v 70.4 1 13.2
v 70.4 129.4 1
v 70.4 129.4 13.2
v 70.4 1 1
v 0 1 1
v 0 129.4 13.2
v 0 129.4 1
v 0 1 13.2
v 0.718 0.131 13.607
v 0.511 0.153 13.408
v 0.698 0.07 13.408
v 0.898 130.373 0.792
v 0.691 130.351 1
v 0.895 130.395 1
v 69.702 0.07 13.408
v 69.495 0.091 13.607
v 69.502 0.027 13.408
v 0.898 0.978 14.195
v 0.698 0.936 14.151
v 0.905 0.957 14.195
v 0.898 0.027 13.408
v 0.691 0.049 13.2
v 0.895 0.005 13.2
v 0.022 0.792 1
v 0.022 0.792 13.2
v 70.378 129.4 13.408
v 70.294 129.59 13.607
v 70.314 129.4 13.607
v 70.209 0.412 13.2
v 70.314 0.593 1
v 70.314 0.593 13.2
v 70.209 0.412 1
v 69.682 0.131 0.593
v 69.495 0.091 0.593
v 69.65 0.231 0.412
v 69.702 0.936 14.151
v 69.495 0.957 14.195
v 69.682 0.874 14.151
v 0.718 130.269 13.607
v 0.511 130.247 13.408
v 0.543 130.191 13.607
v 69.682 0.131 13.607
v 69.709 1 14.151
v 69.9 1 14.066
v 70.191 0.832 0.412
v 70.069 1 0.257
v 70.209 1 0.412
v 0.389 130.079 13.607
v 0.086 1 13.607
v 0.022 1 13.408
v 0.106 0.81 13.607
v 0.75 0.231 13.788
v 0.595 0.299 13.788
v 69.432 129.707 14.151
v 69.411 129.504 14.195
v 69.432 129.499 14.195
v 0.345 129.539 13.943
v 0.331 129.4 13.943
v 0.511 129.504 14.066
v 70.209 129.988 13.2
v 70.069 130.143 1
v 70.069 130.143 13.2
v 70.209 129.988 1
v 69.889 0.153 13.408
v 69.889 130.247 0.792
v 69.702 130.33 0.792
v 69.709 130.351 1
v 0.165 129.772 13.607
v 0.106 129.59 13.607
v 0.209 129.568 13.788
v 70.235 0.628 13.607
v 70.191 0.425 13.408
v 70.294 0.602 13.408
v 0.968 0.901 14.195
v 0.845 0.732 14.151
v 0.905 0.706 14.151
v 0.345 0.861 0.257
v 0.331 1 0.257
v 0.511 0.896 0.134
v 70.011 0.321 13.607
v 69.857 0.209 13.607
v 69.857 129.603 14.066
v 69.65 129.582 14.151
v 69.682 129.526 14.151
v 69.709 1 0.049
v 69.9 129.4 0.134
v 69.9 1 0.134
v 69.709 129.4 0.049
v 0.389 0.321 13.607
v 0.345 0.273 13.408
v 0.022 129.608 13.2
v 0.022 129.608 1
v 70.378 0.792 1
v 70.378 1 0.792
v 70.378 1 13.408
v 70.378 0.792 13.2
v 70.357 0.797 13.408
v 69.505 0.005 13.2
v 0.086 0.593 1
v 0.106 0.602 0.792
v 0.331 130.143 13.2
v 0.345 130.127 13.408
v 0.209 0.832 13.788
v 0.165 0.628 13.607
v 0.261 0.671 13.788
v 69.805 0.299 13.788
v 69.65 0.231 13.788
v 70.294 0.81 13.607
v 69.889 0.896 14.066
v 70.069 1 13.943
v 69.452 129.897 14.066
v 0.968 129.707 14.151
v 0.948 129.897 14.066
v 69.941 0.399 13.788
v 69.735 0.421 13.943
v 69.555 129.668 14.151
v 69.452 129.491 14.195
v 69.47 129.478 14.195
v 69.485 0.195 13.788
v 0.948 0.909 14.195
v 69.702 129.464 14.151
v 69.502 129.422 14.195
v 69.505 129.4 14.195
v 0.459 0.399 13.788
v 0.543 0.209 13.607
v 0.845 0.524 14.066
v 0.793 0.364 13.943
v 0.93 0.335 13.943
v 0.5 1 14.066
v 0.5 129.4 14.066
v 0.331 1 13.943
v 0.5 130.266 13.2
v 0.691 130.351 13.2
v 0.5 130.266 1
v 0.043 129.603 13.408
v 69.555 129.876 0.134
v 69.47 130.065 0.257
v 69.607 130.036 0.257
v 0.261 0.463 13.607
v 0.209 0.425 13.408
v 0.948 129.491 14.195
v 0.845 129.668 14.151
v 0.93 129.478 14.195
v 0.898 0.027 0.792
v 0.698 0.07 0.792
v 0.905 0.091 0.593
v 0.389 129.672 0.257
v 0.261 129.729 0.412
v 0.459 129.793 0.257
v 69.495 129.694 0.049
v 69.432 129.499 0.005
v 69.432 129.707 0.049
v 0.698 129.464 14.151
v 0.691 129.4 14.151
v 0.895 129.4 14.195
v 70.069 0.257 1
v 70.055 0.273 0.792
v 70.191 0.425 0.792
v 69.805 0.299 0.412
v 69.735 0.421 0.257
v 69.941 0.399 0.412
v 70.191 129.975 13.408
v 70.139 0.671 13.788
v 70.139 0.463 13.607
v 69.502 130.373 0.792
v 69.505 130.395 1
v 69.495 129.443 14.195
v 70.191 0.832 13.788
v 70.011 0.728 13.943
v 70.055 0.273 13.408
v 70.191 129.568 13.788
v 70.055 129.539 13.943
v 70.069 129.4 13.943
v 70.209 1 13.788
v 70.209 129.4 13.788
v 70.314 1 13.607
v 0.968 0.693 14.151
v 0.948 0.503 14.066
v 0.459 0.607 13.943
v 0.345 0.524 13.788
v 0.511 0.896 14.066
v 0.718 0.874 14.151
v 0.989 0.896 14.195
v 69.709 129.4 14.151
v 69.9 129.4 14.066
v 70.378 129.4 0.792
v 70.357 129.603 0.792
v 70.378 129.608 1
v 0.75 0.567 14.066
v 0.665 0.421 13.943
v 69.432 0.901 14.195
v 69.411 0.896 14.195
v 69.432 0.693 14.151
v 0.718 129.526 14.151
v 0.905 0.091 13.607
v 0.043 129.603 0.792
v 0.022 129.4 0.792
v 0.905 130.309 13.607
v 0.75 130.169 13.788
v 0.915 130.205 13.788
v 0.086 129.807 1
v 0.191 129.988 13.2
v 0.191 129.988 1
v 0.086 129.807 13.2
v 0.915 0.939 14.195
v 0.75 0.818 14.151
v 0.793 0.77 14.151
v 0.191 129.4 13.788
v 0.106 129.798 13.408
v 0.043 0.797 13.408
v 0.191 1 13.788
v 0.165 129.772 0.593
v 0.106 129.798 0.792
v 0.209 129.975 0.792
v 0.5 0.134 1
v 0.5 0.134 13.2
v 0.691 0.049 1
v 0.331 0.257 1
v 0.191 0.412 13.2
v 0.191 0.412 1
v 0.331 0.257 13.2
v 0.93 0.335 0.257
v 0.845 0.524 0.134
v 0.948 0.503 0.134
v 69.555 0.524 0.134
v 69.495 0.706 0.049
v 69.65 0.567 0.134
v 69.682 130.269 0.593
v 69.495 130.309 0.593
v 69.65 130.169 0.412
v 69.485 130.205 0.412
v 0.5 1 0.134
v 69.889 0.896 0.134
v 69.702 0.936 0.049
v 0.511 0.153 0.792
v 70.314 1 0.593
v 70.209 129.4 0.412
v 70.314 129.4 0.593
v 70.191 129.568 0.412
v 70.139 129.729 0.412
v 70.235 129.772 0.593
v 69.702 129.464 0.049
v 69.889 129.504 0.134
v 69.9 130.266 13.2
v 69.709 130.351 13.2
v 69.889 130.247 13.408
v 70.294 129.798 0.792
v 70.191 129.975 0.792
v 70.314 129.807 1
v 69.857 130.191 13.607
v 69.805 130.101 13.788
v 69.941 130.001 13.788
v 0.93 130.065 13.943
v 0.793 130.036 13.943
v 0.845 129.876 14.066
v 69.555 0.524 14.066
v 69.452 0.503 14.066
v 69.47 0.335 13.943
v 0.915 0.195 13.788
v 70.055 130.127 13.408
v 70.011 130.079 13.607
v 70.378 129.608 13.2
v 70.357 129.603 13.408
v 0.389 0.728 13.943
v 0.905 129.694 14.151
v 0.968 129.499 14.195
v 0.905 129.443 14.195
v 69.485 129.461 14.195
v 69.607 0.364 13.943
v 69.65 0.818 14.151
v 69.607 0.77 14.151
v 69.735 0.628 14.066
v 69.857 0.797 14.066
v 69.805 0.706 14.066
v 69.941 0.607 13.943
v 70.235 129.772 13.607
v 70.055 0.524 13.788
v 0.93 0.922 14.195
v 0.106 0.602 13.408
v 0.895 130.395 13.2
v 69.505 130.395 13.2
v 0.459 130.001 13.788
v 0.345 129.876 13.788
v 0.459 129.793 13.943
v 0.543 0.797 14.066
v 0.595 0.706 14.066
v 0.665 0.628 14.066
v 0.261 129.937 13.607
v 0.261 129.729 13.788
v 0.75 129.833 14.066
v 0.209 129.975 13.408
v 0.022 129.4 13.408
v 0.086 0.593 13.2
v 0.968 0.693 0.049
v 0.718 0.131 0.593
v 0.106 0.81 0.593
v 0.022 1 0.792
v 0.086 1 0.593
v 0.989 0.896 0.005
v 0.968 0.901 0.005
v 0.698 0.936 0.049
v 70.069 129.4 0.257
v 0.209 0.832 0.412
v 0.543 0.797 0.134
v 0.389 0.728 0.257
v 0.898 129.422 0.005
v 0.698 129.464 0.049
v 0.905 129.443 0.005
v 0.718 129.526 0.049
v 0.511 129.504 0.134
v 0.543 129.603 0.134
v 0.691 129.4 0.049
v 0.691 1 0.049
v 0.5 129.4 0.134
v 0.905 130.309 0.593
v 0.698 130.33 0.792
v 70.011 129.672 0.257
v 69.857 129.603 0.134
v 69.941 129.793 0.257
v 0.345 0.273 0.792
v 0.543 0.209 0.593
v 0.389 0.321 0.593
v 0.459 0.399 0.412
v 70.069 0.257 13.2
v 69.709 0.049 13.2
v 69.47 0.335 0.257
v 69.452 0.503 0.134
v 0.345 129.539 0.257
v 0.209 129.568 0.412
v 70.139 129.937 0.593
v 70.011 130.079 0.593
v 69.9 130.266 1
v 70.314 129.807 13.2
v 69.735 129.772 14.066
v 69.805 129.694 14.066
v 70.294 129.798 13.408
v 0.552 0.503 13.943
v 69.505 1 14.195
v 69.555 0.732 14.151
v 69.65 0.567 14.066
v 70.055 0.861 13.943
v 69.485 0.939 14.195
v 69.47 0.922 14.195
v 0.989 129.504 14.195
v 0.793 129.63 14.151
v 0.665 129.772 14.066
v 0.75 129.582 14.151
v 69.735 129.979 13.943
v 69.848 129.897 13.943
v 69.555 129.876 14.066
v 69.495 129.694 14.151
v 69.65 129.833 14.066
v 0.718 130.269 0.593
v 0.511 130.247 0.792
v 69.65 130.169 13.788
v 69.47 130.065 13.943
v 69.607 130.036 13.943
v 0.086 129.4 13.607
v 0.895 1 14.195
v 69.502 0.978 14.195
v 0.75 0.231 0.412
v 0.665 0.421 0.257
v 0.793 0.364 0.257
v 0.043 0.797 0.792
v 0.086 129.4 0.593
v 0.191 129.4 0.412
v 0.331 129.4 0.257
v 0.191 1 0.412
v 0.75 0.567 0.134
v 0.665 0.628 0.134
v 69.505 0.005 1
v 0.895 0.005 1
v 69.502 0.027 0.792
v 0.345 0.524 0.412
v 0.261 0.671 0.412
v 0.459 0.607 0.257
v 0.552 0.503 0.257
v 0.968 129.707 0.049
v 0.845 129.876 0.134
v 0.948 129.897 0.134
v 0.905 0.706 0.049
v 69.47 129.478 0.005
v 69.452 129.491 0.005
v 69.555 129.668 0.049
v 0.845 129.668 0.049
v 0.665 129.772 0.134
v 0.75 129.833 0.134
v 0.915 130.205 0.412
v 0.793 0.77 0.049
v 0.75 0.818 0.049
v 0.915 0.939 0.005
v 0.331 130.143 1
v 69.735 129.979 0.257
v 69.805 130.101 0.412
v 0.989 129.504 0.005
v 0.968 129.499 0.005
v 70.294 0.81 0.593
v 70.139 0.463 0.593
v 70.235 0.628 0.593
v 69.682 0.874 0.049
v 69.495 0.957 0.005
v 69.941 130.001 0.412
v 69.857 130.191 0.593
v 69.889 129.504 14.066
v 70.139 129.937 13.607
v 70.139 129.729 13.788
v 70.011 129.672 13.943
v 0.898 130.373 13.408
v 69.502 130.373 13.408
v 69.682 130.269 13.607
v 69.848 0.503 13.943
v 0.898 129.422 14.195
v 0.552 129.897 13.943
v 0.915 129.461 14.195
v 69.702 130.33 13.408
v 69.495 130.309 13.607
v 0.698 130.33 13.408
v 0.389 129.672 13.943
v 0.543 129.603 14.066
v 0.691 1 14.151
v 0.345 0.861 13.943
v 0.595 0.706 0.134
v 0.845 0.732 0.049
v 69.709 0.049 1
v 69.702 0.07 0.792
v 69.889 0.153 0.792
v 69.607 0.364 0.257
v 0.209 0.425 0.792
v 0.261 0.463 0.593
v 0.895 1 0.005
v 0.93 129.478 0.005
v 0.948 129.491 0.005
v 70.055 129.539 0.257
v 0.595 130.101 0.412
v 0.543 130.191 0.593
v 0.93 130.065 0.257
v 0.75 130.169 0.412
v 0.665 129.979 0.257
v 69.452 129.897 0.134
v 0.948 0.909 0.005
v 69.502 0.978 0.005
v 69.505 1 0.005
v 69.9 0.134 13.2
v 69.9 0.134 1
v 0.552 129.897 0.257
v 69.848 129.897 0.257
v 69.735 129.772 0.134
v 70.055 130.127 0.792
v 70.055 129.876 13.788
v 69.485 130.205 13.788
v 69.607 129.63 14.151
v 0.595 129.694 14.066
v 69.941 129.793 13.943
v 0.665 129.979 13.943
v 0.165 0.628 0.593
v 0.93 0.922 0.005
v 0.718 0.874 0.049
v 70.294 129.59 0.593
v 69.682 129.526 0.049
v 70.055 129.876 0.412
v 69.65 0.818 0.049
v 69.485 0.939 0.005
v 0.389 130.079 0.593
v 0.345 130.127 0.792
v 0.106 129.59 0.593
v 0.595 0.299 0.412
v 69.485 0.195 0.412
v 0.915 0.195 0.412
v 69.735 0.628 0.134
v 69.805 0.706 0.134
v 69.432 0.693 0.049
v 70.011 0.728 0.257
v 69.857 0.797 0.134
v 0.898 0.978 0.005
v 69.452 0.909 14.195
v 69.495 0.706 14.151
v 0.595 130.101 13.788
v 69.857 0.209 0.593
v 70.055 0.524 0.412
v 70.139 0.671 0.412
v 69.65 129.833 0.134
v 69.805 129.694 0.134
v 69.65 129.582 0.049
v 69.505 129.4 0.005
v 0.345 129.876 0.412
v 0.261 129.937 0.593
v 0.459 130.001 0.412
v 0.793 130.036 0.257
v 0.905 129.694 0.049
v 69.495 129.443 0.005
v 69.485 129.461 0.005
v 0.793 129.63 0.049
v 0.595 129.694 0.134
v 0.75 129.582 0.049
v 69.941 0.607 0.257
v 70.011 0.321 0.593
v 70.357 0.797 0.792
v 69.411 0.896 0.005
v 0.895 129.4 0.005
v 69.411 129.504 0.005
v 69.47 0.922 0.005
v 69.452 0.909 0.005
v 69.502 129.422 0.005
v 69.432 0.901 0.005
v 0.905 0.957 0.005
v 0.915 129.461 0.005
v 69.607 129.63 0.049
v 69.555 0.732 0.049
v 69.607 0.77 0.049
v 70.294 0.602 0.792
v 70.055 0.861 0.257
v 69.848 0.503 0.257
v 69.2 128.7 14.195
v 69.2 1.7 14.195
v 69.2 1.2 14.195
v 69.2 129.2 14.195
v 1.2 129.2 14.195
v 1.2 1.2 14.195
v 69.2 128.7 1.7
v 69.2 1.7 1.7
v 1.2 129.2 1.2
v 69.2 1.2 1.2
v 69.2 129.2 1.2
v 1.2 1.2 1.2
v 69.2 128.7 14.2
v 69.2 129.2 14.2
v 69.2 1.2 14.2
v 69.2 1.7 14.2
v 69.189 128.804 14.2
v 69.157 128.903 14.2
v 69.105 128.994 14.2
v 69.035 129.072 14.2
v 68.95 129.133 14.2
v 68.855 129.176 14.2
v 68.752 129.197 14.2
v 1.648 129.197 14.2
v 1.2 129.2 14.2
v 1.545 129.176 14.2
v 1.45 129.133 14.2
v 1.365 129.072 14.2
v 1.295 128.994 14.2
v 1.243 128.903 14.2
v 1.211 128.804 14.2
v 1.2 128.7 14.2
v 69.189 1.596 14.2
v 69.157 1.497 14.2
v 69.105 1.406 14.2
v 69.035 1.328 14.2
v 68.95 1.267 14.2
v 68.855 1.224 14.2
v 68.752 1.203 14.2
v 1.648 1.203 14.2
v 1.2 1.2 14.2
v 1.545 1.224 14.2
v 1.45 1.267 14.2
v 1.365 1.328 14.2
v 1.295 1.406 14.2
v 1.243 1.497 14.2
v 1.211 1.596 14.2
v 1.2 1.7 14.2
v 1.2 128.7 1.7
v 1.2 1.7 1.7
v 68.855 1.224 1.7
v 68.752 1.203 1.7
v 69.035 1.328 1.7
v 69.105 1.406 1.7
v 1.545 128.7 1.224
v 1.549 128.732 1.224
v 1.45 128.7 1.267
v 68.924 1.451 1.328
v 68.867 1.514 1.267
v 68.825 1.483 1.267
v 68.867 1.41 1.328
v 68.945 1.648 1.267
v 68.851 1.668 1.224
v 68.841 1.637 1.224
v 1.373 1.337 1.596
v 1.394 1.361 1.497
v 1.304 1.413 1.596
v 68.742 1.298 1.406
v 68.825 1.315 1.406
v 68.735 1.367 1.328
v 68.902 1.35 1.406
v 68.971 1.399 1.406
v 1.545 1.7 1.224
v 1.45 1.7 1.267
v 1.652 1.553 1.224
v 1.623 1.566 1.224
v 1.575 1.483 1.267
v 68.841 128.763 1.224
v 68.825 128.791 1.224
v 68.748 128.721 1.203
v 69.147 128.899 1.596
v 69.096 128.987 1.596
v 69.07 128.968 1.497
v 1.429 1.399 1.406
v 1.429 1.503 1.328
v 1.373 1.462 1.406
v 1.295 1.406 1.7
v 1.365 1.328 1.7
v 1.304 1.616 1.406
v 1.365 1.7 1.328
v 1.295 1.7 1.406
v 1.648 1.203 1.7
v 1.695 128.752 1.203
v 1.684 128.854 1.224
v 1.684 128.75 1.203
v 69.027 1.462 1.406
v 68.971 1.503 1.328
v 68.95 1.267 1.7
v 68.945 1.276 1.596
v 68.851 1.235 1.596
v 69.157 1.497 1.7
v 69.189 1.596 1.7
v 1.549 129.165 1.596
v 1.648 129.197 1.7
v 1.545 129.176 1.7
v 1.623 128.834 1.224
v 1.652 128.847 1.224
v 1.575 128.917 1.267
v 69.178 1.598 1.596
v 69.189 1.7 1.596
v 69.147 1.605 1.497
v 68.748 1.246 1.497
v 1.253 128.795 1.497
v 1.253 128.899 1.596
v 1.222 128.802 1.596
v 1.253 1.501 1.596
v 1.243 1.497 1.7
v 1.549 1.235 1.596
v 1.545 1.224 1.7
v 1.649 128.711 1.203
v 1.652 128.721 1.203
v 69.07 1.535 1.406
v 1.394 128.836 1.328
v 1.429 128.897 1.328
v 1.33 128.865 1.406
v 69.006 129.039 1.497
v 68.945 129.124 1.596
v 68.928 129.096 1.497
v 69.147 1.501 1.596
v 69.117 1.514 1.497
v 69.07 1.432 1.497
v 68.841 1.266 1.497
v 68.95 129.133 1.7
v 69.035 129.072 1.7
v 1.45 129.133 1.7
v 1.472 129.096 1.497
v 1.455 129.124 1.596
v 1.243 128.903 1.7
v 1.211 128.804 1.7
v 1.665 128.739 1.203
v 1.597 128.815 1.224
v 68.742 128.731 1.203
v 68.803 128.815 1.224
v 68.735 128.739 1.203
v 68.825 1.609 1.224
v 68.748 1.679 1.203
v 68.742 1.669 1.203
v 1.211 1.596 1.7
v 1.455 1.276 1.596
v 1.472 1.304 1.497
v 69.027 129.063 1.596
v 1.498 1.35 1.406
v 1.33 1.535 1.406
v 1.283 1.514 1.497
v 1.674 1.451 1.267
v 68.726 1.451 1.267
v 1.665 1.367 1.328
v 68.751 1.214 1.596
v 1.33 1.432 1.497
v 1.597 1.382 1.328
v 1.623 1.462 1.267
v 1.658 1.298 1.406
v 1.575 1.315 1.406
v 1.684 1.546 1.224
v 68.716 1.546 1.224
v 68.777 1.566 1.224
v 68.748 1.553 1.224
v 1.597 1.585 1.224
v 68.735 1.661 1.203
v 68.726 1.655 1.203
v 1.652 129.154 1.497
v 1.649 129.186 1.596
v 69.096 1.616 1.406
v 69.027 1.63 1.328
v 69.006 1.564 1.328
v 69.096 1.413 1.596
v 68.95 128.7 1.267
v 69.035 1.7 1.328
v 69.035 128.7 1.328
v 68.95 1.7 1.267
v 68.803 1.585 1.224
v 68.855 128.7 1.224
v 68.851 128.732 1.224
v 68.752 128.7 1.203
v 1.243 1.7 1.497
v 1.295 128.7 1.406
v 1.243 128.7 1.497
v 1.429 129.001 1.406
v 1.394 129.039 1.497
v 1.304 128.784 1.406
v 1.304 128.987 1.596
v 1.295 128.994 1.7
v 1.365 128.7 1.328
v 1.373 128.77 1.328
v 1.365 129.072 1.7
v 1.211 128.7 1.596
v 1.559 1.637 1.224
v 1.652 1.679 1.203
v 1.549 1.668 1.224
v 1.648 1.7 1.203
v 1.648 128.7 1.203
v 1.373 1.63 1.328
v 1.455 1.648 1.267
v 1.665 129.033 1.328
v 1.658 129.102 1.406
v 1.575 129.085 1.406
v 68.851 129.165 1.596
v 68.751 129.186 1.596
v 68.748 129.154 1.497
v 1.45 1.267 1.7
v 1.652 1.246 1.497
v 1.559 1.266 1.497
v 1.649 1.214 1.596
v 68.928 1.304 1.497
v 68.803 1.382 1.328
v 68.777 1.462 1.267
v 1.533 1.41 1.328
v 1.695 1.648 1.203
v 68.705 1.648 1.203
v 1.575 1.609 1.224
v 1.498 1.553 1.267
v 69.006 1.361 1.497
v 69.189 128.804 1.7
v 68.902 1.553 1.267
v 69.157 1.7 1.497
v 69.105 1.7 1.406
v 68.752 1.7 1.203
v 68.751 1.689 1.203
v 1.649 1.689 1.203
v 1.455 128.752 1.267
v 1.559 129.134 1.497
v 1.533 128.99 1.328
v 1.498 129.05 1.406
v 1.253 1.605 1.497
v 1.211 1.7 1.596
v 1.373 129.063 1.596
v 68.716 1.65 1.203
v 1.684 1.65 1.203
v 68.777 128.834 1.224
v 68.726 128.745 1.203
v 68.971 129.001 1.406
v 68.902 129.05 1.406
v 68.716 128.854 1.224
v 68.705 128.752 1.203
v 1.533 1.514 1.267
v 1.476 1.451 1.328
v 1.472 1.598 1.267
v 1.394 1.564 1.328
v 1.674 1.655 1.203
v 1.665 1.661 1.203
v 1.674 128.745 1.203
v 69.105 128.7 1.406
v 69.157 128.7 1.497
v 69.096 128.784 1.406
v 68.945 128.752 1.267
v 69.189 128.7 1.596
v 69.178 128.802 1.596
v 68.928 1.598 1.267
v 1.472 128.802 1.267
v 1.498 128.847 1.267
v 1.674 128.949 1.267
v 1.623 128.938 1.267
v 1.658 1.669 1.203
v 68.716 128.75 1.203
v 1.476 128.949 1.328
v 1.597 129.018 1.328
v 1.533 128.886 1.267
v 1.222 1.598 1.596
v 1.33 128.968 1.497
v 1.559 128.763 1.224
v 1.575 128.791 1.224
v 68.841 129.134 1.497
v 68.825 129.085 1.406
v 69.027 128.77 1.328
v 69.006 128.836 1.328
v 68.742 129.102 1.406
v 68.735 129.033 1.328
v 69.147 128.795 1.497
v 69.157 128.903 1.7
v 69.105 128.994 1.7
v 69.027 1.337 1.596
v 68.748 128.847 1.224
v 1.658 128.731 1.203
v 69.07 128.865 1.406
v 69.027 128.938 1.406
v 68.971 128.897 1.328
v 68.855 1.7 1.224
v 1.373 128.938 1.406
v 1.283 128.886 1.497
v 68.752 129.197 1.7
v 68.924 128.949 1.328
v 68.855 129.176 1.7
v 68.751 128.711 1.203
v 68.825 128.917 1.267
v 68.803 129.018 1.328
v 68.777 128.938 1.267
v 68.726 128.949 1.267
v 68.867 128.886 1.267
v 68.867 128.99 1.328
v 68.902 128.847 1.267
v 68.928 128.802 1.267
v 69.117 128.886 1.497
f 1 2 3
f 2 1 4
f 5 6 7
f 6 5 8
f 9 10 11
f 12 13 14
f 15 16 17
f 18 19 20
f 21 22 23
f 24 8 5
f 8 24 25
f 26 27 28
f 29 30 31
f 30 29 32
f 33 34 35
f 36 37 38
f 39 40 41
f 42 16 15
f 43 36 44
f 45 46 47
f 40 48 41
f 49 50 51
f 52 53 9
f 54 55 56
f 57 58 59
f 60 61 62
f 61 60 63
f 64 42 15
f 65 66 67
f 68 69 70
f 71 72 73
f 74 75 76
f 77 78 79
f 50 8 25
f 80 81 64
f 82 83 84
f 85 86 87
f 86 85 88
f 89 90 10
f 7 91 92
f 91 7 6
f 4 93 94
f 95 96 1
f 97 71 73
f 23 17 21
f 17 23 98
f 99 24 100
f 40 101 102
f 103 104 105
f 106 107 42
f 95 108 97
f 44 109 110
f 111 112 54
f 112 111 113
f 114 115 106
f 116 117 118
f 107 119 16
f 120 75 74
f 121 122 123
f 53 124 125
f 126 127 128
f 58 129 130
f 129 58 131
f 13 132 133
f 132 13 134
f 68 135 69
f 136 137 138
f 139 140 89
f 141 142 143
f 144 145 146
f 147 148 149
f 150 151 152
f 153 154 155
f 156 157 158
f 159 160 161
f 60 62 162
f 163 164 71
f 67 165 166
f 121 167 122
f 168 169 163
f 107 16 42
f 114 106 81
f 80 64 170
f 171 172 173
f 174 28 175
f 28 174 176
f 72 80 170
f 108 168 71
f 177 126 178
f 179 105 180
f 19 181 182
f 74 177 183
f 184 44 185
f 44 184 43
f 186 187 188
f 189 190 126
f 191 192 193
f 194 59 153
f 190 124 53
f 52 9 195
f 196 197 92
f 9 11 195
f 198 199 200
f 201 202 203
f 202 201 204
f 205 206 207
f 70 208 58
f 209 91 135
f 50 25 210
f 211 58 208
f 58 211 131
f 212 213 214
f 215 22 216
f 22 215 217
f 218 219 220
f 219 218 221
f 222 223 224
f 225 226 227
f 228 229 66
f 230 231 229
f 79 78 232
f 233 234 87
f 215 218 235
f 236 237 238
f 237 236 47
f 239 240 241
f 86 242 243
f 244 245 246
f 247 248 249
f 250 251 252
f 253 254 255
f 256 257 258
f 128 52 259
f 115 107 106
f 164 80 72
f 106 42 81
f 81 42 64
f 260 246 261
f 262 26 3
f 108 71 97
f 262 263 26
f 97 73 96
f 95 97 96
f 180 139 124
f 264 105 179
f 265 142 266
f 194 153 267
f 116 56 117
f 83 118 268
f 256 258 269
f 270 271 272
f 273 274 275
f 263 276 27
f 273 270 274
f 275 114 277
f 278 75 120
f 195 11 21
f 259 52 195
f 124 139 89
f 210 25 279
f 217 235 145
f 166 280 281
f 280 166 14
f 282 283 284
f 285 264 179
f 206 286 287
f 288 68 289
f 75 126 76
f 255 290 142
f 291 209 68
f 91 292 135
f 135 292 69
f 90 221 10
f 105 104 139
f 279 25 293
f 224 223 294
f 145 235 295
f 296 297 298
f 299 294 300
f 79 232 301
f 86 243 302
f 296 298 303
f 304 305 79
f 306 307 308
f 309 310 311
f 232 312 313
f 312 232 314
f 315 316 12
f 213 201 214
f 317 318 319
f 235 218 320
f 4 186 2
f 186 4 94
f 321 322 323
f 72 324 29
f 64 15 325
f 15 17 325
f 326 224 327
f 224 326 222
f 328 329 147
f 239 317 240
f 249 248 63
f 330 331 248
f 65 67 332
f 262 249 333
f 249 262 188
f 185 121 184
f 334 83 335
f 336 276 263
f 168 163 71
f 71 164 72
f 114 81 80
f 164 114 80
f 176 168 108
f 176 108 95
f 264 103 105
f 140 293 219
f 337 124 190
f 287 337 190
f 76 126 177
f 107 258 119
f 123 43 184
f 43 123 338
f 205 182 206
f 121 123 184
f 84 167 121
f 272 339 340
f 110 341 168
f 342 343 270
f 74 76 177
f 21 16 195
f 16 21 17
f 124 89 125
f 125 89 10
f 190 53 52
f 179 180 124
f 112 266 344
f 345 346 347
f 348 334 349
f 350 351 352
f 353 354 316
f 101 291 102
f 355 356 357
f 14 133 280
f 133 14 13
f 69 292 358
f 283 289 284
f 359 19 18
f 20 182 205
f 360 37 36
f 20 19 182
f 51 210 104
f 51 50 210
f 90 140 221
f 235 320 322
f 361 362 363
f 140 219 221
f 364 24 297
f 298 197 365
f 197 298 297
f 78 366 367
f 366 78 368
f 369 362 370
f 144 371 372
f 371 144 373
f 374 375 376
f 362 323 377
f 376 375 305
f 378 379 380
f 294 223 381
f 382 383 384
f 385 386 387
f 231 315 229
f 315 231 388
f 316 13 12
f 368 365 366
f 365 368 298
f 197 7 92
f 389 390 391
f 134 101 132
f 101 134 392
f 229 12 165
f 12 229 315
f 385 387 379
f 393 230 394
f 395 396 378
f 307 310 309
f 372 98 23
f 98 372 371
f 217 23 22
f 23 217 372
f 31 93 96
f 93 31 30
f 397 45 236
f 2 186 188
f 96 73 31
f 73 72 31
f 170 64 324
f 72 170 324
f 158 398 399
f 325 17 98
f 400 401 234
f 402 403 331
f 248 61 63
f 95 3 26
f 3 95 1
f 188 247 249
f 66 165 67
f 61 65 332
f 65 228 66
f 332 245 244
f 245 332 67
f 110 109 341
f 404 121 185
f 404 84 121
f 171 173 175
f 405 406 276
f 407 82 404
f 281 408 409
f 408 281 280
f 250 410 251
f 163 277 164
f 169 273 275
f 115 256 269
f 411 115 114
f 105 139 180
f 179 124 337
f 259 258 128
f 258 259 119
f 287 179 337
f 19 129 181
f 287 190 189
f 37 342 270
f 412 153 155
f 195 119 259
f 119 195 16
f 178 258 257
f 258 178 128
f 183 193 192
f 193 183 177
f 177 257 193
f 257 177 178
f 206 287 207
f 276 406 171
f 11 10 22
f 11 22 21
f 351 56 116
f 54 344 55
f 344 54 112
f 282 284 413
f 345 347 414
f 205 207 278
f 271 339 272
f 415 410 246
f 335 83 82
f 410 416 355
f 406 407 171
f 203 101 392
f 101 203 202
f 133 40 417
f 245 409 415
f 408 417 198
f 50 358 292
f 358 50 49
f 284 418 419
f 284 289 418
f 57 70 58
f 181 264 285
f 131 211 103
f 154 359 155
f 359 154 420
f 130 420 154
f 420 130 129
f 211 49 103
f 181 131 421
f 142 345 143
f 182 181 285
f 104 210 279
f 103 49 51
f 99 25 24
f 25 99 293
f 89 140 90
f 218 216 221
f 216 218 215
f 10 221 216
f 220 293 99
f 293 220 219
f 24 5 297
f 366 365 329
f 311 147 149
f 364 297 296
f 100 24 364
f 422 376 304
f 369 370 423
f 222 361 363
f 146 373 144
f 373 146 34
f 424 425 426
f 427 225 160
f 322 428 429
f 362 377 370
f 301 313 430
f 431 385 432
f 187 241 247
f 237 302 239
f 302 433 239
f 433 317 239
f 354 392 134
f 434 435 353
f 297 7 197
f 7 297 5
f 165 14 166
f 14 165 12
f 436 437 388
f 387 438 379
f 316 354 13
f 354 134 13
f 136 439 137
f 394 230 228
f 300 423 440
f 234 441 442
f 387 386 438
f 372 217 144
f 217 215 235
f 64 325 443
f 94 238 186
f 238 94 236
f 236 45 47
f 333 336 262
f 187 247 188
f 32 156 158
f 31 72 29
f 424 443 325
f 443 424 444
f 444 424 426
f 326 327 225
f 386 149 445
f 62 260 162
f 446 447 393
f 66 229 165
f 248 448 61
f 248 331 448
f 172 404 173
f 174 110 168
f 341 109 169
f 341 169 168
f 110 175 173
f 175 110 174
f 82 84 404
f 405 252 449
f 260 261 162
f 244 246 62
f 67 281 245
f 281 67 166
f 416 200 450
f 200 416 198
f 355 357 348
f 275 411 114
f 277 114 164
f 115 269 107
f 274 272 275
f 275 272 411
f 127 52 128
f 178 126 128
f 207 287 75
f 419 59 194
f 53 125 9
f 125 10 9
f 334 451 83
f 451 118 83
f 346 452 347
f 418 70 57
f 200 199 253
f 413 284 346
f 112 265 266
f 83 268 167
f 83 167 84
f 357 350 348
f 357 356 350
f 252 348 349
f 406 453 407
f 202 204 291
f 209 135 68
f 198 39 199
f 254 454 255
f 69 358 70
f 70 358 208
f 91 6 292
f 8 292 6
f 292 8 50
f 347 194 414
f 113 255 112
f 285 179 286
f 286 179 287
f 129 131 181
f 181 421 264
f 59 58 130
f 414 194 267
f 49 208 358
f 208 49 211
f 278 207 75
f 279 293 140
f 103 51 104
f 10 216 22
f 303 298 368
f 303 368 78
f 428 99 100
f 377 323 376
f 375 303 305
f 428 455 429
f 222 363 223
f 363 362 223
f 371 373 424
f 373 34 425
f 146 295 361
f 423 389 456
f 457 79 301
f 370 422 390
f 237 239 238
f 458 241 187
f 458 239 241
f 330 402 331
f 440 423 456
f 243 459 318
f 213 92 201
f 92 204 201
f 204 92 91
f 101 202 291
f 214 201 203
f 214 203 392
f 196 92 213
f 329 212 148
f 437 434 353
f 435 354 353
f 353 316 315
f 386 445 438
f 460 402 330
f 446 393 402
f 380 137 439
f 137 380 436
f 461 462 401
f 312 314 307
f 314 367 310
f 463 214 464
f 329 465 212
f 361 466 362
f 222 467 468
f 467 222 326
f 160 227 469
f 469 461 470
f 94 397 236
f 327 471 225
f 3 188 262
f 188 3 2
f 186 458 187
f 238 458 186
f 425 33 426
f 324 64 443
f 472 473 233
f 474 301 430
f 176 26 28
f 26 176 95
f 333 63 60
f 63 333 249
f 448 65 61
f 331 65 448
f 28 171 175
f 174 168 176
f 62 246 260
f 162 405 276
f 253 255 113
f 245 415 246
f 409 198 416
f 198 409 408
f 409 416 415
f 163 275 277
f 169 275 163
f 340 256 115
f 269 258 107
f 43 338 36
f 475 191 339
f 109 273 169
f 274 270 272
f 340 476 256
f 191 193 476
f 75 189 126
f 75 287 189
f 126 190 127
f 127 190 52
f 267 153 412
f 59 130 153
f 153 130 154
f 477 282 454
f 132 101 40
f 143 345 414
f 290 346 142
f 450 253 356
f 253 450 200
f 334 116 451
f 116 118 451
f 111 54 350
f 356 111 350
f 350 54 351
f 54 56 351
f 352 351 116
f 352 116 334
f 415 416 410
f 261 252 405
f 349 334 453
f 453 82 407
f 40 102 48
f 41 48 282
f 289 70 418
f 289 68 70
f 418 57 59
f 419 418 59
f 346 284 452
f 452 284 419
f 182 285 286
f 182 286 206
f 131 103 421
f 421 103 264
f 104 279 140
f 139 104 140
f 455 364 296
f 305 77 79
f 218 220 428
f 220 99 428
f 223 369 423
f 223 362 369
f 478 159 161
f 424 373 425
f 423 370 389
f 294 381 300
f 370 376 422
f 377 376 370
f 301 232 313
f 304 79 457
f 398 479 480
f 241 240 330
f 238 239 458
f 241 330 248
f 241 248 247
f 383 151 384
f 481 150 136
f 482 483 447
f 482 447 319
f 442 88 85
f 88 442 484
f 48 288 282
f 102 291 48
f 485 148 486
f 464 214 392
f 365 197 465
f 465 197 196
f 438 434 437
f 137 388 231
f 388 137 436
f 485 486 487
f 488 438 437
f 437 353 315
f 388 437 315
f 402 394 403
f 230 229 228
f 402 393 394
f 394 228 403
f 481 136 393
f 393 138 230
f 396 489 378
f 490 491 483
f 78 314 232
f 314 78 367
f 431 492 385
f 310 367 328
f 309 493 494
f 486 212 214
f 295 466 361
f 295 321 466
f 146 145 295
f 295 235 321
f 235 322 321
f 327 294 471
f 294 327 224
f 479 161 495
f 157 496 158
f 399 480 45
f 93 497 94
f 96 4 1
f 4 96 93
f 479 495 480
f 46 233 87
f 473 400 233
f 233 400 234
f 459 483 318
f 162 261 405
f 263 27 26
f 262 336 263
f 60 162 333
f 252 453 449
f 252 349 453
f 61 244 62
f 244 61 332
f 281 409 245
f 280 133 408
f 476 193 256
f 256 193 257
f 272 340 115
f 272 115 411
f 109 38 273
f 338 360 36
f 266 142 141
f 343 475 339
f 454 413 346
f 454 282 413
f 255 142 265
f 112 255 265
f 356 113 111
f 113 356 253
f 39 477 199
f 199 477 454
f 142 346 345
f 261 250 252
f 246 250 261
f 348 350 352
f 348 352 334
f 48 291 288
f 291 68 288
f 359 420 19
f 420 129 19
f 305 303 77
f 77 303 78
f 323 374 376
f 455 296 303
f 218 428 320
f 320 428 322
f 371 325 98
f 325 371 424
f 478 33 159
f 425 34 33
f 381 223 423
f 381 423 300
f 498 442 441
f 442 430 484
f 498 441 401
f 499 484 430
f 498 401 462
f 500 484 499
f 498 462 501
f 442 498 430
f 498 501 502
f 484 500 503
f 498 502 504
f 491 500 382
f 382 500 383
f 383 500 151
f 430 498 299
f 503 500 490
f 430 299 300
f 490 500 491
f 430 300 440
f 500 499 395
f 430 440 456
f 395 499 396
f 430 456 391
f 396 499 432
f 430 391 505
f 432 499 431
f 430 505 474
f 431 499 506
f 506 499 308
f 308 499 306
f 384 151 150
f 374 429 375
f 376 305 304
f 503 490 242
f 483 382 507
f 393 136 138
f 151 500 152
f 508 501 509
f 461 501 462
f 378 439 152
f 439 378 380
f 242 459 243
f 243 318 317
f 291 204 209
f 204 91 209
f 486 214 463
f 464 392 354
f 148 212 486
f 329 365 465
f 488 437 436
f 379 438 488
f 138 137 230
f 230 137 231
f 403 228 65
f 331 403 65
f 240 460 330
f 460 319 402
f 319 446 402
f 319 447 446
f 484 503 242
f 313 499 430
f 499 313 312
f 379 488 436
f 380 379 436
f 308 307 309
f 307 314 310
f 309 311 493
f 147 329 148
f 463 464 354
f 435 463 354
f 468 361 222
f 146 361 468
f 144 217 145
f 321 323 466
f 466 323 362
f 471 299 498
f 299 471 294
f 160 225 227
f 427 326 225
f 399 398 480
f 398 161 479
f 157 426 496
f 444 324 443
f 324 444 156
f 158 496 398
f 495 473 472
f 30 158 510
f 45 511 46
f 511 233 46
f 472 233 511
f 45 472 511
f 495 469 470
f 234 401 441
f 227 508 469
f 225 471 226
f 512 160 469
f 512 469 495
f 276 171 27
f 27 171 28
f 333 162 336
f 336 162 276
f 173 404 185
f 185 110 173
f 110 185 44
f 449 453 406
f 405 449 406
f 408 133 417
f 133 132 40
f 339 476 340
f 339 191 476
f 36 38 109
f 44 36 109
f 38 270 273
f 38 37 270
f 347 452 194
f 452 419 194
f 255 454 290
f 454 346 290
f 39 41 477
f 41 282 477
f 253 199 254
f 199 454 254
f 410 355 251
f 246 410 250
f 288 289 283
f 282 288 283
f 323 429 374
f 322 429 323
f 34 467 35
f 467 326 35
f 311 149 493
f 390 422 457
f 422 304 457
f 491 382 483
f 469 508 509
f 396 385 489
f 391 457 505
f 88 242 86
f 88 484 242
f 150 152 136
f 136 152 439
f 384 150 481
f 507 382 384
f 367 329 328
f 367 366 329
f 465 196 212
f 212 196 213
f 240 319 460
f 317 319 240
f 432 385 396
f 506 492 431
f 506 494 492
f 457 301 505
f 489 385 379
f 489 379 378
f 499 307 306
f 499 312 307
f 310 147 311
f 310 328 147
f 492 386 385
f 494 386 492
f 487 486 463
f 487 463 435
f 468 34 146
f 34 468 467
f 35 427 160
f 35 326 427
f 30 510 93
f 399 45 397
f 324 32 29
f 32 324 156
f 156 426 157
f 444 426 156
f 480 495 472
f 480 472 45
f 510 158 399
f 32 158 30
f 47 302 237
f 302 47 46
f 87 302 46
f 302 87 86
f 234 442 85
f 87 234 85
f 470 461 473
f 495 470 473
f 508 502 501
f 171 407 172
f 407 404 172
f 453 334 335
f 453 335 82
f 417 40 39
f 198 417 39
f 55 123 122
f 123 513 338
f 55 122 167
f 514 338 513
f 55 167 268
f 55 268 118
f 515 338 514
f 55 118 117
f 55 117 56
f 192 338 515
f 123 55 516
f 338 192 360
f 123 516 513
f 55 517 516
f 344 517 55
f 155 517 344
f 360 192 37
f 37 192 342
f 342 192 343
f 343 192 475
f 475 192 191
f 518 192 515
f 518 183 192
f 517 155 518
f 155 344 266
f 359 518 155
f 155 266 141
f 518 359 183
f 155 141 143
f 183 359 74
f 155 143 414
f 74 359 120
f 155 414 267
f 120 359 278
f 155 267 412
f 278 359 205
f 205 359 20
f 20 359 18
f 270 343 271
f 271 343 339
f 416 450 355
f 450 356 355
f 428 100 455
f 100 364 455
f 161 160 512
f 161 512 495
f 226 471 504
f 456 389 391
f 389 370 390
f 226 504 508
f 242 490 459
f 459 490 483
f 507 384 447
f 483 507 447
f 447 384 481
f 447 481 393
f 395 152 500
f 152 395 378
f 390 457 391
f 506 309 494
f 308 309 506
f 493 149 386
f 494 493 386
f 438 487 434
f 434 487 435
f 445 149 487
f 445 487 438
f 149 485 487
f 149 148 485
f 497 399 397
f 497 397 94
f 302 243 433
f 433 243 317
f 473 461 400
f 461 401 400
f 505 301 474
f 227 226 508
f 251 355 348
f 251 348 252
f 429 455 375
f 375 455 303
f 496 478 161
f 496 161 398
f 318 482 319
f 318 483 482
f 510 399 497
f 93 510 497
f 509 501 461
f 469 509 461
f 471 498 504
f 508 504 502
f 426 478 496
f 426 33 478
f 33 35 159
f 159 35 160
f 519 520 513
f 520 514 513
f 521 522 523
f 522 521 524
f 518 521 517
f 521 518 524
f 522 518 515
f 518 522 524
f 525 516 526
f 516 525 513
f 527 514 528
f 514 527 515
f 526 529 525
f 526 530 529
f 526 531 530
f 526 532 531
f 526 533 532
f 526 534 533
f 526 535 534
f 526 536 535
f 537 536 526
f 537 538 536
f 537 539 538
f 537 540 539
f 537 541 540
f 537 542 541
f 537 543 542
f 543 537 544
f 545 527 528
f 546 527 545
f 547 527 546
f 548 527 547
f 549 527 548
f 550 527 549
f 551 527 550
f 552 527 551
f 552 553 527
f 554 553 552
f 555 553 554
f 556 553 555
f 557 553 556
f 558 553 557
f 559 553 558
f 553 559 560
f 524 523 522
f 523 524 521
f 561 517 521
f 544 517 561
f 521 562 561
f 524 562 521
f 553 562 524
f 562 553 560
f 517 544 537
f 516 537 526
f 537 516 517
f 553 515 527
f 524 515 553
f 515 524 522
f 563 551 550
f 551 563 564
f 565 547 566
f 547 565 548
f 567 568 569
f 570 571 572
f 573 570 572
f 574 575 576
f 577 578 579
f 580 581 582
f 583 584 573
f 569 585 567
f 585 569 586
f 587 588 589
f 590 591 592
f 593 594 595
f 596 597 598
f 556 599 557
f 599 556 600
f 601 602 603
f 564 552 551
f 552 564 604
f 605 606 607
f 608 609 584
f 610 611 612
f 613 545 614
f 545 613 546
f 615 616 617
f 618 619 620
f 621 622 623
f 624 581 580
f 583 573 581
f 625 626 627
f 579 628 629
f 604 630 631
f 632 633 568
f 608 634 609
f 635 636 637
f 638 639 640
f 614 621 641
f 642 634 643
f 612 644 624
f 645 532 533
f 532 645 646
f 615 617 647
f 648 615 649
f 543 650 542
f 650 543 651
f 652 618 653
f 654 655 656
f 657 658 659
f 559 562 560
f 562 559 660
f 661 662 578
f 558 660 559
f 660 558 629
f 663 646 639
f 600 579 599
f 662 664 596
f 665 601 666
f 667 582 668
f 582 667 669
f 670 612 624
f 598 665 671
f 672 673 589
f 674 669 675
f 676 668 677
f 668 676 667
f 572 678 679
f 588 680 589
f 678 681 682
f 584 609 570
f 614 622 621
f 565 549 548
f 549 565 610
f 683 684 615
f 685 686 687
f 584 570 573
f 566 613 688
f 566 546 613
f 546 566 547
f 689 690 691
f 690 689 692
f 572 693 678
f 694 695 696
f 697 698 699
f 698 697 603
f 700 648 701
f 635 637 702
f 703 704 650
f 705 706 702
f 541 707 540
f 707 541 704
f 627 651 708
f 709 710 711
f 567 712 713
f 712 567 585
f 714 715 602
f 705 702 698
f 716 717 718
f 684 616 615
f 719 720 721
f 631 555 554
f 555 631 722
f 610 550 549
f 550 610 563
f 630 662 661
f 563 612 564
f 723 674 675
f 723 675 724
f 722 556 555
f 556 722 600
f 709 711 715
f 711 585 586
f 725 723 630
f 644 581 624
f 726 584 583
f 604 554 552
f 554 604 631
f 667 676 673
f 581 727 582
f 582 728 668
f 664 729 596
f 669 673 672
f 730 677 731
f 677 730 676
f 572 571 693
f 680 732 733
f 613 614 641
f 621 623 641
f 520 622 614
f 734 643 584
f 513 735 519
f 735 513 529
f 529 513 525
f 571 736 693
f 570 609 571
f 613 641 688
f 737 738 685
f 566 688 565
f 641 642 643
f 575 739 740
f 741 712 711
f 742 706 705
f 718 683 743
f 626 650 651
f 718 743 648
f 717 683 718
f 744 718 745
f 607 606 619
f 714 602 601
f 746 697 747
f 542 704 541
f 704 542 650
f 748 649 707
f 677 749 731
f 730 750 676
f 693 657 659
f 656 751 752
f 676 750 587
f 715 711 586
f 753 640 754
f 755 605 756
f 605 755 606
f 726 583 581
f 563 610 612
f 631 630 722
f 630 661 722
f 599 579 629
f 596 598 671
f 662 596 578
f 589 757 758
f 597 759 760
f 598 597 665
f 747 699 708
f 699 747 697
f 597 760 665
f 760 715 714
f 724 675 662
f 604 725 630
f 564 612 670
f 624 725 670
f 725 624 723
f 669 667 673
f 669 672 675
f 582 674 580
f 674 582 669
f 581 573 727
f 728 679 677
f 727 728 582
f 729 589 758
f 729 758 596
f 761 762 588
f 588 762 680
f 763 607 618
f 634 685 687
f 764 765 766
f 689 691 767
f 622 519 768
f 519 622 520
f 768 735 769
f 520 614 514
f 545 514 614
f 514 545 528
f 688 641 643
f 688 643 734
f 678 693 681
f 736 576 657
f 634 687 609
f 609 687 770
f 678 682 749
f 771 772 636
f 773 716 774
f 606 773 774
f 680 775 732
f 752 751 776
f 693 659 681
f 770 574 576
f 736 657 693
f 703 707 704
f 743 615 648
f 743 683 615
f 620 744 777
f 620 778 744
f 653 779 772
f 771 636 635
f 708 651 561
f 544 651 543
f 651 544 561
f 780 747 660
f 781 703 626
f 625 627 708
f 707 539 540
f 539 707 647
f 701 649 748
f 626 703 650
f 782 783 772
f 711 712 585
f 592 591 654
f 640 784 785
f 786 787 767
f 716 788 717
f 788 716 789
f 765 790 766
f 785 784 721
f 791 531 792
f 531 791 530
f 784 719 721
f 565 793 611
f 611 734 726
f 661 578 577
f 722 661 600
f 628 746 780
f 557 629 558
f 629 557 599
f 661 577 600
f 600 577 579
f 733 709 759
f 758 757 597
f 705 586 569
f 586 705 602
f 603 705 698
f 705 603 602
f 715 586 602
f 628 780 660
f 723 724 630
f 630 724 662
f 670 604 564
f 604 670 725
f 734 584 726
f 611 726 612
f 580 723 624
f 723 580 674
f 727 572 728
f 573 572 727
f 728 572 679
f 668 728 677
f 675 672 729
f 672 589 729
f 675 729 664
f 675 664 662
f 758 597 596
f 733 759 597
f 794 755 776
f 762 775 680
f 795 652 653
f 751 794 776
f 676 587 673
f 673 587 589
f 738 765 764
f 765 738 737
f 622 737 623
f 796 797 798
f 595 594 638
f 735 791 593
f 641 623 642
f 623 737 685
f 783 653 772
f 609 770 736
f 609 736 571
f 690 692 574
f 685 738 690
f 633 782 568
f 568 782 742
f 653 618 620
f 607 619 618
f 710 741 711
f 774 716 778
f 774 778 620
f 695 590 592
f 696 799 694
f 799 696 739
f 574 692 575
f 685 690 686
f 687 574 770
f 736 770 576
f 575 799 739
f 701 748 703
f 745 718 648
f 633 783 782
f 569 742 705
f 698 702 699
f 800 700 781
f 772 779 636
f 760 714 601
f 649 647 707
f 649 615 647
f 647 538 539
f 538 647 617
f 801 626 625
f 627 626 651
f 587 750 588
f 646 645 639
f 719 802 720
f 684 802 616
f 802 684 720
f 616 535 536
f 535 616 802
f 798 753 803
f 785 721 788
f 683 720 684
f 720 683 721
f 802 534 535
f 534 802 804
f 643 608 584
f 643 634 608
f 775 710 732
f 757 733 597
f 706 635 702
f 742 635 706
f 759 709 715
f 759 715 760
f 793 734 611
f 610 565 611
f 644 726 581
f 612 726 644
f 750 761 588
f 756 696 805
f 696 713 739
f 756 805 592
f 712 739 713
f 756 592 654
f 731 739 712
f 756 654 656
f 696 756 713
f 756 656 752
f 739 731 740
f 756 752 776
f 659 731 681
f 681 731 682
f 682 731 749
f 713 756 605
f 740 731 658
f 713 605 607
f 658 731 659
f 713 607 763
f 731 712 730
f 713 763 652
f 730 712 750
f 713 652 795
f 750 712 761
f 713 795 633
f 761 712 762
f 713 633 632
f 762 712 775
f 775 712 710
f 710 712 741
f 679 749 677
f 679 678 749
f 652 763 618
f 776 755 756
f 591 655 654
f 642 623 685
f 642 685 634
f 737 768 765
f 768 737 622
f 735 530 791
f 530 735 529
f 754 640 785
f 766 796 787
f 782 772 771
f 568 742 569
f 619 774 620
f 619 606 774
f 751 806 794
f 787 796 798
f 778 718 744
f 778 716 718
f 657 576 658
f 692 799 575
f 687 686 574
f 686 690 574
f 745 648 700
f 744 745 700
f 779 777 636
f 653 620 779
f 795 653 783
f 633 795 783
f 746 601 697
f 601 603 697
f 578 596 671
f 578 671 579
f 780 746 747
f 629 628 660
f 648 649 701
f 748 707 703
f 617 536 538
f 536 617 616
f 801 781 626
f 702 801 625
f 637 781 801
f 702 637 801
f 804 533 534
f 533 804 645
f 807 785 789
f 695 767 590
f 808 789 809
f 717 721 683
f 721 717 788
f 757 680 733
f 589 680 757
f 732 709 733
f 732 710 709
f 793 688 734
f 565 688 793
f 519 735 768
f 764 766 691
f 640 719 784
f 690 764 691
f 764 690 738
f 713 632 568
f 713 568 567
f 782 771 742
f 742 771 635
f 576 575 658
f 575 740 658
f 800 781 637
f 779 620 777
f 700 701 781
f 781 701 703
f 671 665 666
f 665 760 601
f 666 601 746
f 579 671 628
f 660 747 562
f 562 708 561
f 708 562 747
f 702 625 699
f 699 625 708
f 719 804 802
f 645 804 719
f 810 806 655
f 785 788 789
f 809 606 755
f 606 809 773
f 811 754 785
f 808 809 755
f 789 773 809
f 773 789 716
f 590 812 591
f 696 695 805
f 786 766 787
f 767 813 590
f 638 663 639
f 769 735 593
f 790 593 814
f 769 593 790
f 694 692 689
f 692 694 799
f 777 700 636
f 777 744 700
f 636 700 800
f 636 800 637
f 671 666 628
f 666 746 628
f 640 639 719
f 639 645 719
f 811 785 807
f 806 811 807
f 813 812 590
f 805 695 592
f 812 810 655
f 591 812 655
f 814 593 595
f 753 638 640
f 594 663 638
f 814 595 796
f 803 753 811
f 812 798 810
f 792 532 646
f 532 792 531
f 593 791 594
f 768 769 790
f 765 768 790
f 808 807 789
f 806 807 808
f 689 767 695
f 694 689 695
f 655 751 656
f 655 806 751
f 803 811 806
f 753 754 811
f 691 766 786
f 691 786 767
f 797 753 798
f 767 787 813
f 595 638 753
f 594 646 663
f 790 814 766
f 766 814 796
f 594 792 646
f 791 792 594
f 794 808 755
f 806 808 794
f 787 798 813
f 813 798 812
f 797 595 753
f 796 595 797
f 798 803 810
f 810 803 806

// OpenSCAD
// Download both files into the same directory and make a copy of this template for each project. Adjust the variables and values as needed to override the defaults in this file as needed. In this way you can replace the `Ultimate_Box_Generator.scad` file with a new version without having to track and restore your changes.

// If you want to use any framework variables in calulations you must import them here. If you want to also change the variable you must use a second line below to do that.
//wall=wall;
//internal_wall=internal_wall;

// Include the framework. You can change the prefix to load from a shared path.
include    <Ultimate_Box_Generator.scad>;

// At this point you can start to adjust builtin varaibles and create your own. There are also some examples of more complex boxes at the end of the file.


// Parts to render. To do more complex opperations disable these and manually call make_box() and make_lid() instead.
show_box=false;	// Whether or not to render the box
show_lid=false;	// Whether or not to render the lid. To make open boxes with no lid set `show_lid=false` and `lid_type=5`.
lid_type=0; 

// General Settings
// comp_size_deep = 18; // Depth of compartments
// comp_size_x = 32;	 // Size of compartments, X
// comp_size_y = 24.6;	 // Size of compartments, Y
wall = 1.2;		    // Width of wall, see `internal_wall` below for alternate inner wall size.
internal_wall=0.8;
// repeat_x = 3;		// Number of compartments, X
// repeat_y = 2;		// Number of compartments, Y
//tolerance=.15;      // Tolerance around lid.  If it's too tight, increase this. If it's too loose, decrease it.

// Box Rounding
box_corner_radius=1; // Add a rounding affect to the corners of the box. Anything over `wall` will cause structure and lid problems.
internal_corner_radius=.5; // Add a rounding affect to the inside.
//mesh_corner_radius=0; // Leave a radius around each corner of the mesh. May hep with bridges.
//corner_fn=30;

// Supress individual walls.
//supress_walls_x=[]; // These are the walls running along the X axis. It should be an array of size [repeat_y-1][repeat_x].
//supress_walls_y=[]; // These are the walls running along the Y axis. It should be an array of size [repeat_x-1][repeat_y].
// Example for repeat_x=4, repeat_y=3:
//supress_walls_x=[[1,1]];
//supress_walls_y=[[1,0,1],[0,1,1],[1,1,1]];
//supress_sides=false; // [X, Y, X, Y] Cutout/supress some sides. this may behave baddly with compartments or mesh.
//supress_sides_radius=wall; // Add a rounding to the cutout.
//supress_sides_offset=0; // 0, wall, [X, Y, Z] adjsut the coutout in all directions. + to grow, - so shrink
//supress_sides_fn=30;

//Internal Structure (You may need to turn off `mesh_do_sides` or `mesh_do_bottom` for good results.)
// You can also use `make_wall()` to manually add your own walls.
// 1: Rounded bottom frame.
// 2: Hexagon bottom frame. (To make this shape perfect set `comp_size_deep` to the width between to edges of the tile and set `comp_size_x` or `comp_size_y` to this this: `comp_size_deep / sqrt(3)*2`.
// 3: Rough bottom to make bits sit unevenly. (Partial)
// 4: Vertical rounding on corner. Set `internal_size_deep` to `comp_size_deep` and `internal_size_circle` to the shortest `comp_size` for a circle.
// 5: Vertical hexegon. Results may varry.
//internal_type=0; // Internal structure, see above.
//internal_rotate=false; // On lid axis or rotate to opposite.
//internal_size_deep=comp_size_deep/2; // How far into the box to start the internal structure. Should be `comp_size_deep/2` for type 1-2, `wall` for 3, or comp_size_deep for type 4-5.
//internal_size_circle=internal_type==1 ? internal_size_deep : internal_size_deep * 2 / sqrt(3); // Use this calculation, or the shorter comp_size for type 4-5.
//internal_fn=internal_type==1 || internal_type==4 ? 60 : 6; // Complexity of internal curves, may need to increase for larger or smoother curves.
//internal_wall=wall; // Custom size for internal walls.


// Complex Structure
//make_complex_box=false; // Use an array of objects from `complex_box` to create many smaller boxes within the larger box.
//internal_grow_down=true; // If set compartments will be extruded into the larger box from the top to make a flush surface. (May make a model that uses a lot of material.
//internal_empty_bottom=false; // If set the area blow each box will be empty. This will not be printable on a FDM printer unless supports are included internally but still may save material and print time.



// In addition you can set `show_box=false;` and then call `make_box()` manually to join and remove more structure to it like in this example.
/*show_box=false;
difference() {
    make_box();
    translate([0, comp_size_y/2 + wall, 0])
    rotate([0, 90, 0])
    cylinder(comp_size_x +wall*2, 10, 10);
}*/

// You can also use calls to `make_internal_box` to create more complex boxes within a larger box that share a single lid.
/*show_box=false;
make_box();
intersection() {     
    faction_x=10; faction_y=comp_size_y; faction_z=5; faction_repeat_x=3; faction_repeat_y=1;
    faction_size_x=calc_size(faction_repeat_x, faction_x, wall=internal_wall, internal_wall=internal_wall);
faction_size_y=calc_size(faction_repeat_y, faction_y, wall=internal_wall, internal_wall=internal_wall);
    
    translate([wall, wall, wall])
    cube([faction_size_x - wall, faction_size_y - wall*2, comp_size_deep]);
            
    translate([wall-internal_wall, wall-internal_wall, wall-internal_wall])
    union() {
        translate([0, 0, 0])
        make_internal_box(faction_x, faction_y, faction_z, wall=internal_wall, repeat_x=faction_repeat_x, repeat_y=faction_repeat_y);
    }
}*/

// This exmaple wil make a complex series of boxes in a larger container. The object's can be used to position other oebjects and create internal structure.
comp_size_x = 92-(2*12); // external size add 2*wall to this
comp_size_y = 2*64;    // external width add 2*wall to this
comp_size_deep = 13; // external height add 2*wall to thist

// internal_wall=0.8;
// make the external box with no internal curves
make_box(internal_type=0);
internal_type=1;
internal_size_deep=comp_size_deep  ;
comp2=make_object( x=32.2, y=31.6, z=20, offset_x=90, offset_y=0, repeat_x=3, repeat_y=2, color="Blue");

complex_box=[
   comp2   
];
// make the internal compartments
make_complex_box();

// Some notes on complex prints:
/* OpenSCAD experience is required to do pretty much any type of customization or complex opperations. This will essentialy just make the containers within one larger object with a single lid. Alternatly multiple boxes could be created and joined together with translations to make a larger object with multiple lids. 
   Due to how variables are passed in OpenSCAD it can be tricky to get the parameters set on the parent box and child boxes as you want. It is best to use global variable assignmets to set the child box parameters, then pass overrides to the `make_box()` call yourself. (You have to set `show_box=false;` if you do this.)
  */
